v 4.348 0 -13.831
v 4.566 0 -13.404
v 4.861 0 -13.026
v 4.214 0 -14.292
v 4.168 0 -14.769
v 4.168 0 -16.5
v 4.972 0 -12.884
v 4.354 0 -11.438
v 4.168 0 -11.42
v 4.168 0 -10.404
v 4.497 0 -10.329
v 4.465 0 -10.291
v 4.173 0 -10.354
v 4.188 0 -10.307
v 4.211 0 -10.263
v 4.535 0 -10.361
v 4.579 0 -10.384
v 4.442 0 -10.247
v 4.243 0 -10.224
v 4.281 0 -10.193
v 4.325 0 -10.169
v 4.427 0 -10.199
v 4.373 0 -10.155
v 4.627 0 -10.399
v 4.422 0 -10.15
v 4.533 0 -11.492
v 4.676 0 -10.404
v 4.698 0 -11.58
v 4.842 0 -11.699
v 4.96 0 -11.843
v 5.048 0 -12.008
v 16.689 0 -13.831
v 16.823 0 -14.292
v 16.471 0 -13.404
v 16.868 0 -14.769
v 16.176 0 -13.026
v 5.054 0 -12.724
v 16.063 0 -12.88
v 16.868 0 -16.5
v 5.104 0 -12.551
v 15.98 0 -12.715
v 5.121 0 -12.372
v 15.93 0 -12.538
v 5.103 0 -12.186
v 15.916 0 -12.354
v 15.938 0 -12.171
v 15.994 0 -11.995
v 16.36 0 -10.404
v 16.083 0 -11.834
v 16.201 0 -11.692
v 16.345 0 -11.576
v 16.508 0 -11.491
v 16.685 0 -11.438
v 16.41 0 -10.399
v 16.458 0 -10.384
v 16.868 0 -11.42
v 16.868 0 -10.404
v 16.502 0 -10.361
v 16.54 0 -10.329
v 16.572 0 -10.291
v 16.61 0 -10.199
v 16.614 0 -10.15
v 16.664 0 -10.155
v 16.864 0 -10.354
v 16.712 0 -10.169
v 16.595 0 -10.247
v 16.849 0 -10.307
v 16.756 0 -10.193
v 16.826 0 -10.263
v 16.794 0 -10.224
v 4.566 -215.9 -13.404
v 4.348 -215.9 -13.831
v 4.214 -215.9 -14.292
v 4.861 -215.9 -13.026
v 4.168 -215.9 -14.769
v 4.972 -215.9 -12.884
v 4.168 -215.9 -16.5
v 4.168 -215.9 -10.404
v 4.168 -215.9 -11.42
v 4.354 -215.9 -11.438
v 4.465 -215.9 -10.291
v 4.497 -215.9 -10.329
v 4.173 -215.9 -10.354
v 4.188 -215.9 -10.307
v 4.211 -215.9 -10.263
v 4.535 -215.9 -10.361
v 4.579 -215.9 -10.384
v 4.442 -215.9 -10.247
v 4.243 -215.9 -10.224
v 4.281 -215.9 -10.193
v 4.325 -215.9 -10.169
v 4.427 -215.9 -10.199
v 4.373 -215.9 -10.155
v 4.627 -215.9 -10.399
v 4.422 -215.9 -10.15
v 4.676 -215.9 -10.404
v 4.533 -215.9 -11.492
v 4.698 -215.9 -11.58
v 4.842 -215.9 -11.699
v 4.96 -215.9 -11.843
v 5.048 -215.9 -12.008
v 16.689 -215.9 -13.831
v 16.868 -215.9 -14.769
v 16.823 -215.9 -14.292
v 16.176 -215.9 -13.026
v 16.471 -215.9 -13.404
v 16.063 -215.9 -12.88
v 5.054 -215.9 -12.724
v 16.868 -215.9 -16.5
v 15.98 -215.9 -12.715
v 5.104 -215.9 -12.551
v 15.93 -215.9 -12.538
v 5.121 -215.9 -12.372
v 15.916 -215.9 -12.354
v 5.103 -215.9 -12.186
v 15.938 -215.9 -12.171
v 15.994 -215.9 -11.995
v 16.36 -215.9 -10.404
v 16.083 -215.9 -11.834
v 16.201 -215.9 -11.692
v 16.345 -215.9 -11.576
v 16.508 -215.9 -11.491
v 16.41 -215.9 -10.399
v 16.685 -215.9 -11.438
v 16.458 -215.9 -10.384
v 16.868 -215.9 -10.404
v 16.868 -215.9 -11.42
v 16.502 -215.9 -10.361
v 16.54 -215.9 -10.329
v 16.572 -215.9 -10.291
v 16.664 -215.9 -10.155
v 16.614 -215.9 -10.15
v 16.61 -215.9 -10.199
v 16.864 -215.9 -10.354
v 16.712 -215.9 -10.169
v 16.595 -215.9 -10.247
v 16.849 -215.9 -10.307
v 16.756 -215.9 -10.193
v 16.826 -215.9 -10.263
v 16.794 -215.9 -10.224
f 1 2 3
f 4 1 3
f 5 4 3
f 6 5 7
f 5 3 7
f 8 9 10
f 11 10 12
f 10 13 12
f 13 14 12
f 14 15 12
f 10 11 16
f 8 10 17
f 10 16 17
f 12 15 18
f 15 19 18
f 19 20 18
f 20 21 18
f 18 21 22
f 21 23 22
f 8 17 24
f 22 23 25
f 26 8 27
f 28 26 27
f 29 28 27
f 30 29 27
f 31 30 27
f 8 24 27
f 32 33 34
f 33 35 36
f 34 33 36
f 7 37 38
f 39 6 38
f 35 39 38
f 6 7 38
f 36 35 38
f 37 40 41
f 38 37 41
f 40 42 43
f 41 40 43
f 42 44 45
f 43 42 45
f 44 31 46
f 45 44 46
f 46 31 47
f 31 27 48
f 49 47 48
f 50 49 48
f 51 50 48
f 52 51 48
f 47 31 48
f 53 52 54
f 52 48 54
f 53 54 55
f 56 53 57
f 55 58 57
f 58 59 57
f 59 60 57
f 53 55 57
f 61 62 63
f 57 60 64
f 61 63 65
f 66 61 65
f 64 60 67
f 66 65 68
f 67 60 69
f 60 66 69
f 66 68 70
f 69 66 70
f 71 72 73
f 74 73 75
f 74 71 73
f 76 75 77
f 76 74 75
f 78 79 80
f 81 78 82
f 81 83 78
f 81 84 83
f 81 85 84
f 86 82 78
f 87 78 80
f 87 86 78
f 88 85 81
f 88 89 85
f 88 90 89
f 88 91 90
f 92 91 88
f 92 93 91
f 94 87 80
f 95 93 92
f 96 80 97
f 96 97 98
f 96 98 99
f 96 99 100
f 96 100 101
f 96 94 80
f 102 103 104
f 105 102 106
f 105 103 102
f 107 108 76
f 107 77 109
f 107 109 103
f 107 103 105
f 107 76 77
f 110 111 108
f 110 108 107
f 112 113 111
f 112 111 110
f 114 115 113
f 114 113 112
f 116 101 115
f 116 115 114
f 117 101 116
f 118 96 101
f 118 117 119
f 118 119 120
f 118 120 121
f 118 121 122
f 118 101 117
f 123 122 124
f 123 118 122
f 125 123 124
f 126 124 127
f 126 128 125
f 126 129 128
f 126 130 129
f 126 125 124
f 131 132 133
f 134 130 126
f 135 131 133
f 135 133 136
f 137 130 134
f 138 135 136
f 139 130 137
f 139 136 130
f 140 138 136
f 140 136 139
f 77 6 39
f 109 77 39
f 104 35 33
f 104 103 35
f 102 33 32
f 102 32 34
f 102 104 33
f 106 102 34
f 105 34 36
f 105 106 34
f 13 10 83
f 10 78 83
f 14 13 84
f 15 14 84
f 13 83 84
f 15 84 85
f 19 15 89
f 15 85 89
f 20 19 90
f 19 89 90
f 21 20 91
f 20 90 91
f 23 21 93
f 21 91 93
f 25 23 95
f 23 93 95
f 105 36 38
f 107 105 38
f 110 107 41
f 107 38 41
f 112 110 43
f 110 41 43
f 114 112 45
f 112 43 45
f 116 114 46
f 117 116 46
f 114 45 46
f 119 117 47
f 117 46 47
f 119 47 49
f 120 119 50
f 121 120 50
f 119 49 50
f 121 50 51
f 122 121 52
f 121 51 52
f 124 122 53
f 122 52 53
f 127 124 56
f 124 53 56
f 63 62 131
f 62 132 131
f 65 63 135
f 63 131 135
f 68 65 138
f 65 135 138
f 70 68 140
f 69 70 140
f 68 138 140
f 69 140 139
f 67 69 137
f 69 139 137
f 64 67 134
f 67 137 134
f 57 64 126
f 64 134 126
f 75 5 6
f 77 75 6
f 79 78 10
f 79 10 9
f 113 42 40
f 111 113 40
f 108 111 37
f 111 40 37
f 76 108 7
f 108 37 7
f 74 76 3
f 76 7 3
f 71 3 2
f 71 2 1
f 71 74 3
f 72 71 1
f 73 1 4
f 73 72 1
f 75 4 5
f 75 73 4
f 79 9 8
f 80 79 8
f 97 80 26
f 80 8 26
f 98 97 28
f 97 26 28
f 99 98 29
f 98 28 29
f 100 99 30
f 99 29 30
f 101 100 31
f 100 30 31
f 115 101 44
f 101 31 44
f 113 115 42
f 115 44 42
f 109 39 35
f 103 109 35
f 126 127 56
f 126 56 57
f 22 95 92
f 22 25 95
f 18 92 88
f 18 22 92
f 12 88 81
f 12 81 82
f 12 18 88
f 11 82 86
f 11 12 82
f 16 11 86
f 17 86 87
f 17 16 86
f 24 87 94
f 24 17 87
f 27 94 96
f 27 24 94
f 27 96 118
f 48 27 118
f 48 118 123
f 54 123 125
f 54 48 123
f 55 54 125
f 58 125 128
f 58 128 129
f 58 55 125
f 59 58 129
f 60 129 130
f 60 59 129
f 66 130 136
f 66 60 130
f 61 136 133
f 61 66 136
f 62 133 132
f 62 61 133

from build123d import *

# Parameters (mm, degrees)
F1_DEPTH = 215.9
F2_R     = 2.54
F3_W     = 12.192
F3_H     = 0.254
F4_DEPTH = 215.901
F5_R     = 0.25399


# Not quite as in the source:
# - a fillet or chamfer is up to 0.001 mm smaller than in the source, because OpenCascade refuses the exact size


with BuildPart() as f1:
    # F0 (on Front) → F1 (new body)
    with BuildSketch(Plane.XZ):
        with BuildLine():
            Line((10.5184665114, -10.1497577667), (4.1684665114, -10.1497577667))
            Line((4.1684665114, -10.1497577667), (4.1684665114, -11.4197577667))
            ThreePointArc((4.1684665114, -11.4197577667), (4.8419857204, -11.6987385576), (5.1209665114, -12.3722577667))
            ThreePointArc((5.1209665114, -12.3722577667), (4.8419857204, -13.0457769758), (4.1684665114, -13.3247577667))
            Line((4.1684665114, -13.3247577667), (4.1684665114, -16.4997577667))
            Line((4.1684665114, -16.4997577667), (10.5184665114, -16.4997577667))
            Line((10.5184665114, -16.4997577667), (10.5184665114, -10.1497577667))
        make_face()
        with BuildLine():
            Line((16.8684665114, -10.1497577667), (10.5184665114, -10.1497577667))
            Line((10.5184665114, -10.1497577667), (10.5184665114, -16.4997577667))
            Line((10.5184665114, -16.4997577667), (16.8684665114, -16.4997577667))
            Line((16.8684665114, -16.4997577667), (16.8684665114, -13.3247577667))
            ThreePointArc((16.8684665114, -13.3247577667), (15.9159665114, -12.3722577667), (16.8684665114, -11.4197577667))
            Line((16.8684665114, -11.4197577667), (16.8684665114, -10.1497577667))
        make_face()
    extrude(amount=F1_DEPTH)

    # F2
    f2_edges = [f1.edges().sort_by_distance(p)[0] for p in [
        (16.868467, -107.95, -13.324758),
        (4.168467, -107.95, -13.324758),
    ]]
    fillet(f2_edges, radius=F2_R)

    # F3 (on face) → F4 (cut, through all)
    with BuildSketch(Plane.XZ.offset(215.9)):
        with Locations((10.5184665114, -10.2767577667)):
            Rectangle(F3_W, F3_H)
    extrude(amount=-F4_DEPTH, mode=Mode.SUBTRACT)

    # F5 (radius 0.254 in the source; OpenCascade refuses exactly that, so slightly less here)
    f5_edges = [f1.edges().sort_by_distance(p)[0] for p in [
        (4.422467, -107.95, -10.403758),
        (16.614467, -107.95, -10.403758),
        (16.868467, -107.95, -10.149758),
        (4.168467, -107.95, -10.149758),
    ]]
    fillet(f5_edges, radius=F5_R)


solid = f1.part
